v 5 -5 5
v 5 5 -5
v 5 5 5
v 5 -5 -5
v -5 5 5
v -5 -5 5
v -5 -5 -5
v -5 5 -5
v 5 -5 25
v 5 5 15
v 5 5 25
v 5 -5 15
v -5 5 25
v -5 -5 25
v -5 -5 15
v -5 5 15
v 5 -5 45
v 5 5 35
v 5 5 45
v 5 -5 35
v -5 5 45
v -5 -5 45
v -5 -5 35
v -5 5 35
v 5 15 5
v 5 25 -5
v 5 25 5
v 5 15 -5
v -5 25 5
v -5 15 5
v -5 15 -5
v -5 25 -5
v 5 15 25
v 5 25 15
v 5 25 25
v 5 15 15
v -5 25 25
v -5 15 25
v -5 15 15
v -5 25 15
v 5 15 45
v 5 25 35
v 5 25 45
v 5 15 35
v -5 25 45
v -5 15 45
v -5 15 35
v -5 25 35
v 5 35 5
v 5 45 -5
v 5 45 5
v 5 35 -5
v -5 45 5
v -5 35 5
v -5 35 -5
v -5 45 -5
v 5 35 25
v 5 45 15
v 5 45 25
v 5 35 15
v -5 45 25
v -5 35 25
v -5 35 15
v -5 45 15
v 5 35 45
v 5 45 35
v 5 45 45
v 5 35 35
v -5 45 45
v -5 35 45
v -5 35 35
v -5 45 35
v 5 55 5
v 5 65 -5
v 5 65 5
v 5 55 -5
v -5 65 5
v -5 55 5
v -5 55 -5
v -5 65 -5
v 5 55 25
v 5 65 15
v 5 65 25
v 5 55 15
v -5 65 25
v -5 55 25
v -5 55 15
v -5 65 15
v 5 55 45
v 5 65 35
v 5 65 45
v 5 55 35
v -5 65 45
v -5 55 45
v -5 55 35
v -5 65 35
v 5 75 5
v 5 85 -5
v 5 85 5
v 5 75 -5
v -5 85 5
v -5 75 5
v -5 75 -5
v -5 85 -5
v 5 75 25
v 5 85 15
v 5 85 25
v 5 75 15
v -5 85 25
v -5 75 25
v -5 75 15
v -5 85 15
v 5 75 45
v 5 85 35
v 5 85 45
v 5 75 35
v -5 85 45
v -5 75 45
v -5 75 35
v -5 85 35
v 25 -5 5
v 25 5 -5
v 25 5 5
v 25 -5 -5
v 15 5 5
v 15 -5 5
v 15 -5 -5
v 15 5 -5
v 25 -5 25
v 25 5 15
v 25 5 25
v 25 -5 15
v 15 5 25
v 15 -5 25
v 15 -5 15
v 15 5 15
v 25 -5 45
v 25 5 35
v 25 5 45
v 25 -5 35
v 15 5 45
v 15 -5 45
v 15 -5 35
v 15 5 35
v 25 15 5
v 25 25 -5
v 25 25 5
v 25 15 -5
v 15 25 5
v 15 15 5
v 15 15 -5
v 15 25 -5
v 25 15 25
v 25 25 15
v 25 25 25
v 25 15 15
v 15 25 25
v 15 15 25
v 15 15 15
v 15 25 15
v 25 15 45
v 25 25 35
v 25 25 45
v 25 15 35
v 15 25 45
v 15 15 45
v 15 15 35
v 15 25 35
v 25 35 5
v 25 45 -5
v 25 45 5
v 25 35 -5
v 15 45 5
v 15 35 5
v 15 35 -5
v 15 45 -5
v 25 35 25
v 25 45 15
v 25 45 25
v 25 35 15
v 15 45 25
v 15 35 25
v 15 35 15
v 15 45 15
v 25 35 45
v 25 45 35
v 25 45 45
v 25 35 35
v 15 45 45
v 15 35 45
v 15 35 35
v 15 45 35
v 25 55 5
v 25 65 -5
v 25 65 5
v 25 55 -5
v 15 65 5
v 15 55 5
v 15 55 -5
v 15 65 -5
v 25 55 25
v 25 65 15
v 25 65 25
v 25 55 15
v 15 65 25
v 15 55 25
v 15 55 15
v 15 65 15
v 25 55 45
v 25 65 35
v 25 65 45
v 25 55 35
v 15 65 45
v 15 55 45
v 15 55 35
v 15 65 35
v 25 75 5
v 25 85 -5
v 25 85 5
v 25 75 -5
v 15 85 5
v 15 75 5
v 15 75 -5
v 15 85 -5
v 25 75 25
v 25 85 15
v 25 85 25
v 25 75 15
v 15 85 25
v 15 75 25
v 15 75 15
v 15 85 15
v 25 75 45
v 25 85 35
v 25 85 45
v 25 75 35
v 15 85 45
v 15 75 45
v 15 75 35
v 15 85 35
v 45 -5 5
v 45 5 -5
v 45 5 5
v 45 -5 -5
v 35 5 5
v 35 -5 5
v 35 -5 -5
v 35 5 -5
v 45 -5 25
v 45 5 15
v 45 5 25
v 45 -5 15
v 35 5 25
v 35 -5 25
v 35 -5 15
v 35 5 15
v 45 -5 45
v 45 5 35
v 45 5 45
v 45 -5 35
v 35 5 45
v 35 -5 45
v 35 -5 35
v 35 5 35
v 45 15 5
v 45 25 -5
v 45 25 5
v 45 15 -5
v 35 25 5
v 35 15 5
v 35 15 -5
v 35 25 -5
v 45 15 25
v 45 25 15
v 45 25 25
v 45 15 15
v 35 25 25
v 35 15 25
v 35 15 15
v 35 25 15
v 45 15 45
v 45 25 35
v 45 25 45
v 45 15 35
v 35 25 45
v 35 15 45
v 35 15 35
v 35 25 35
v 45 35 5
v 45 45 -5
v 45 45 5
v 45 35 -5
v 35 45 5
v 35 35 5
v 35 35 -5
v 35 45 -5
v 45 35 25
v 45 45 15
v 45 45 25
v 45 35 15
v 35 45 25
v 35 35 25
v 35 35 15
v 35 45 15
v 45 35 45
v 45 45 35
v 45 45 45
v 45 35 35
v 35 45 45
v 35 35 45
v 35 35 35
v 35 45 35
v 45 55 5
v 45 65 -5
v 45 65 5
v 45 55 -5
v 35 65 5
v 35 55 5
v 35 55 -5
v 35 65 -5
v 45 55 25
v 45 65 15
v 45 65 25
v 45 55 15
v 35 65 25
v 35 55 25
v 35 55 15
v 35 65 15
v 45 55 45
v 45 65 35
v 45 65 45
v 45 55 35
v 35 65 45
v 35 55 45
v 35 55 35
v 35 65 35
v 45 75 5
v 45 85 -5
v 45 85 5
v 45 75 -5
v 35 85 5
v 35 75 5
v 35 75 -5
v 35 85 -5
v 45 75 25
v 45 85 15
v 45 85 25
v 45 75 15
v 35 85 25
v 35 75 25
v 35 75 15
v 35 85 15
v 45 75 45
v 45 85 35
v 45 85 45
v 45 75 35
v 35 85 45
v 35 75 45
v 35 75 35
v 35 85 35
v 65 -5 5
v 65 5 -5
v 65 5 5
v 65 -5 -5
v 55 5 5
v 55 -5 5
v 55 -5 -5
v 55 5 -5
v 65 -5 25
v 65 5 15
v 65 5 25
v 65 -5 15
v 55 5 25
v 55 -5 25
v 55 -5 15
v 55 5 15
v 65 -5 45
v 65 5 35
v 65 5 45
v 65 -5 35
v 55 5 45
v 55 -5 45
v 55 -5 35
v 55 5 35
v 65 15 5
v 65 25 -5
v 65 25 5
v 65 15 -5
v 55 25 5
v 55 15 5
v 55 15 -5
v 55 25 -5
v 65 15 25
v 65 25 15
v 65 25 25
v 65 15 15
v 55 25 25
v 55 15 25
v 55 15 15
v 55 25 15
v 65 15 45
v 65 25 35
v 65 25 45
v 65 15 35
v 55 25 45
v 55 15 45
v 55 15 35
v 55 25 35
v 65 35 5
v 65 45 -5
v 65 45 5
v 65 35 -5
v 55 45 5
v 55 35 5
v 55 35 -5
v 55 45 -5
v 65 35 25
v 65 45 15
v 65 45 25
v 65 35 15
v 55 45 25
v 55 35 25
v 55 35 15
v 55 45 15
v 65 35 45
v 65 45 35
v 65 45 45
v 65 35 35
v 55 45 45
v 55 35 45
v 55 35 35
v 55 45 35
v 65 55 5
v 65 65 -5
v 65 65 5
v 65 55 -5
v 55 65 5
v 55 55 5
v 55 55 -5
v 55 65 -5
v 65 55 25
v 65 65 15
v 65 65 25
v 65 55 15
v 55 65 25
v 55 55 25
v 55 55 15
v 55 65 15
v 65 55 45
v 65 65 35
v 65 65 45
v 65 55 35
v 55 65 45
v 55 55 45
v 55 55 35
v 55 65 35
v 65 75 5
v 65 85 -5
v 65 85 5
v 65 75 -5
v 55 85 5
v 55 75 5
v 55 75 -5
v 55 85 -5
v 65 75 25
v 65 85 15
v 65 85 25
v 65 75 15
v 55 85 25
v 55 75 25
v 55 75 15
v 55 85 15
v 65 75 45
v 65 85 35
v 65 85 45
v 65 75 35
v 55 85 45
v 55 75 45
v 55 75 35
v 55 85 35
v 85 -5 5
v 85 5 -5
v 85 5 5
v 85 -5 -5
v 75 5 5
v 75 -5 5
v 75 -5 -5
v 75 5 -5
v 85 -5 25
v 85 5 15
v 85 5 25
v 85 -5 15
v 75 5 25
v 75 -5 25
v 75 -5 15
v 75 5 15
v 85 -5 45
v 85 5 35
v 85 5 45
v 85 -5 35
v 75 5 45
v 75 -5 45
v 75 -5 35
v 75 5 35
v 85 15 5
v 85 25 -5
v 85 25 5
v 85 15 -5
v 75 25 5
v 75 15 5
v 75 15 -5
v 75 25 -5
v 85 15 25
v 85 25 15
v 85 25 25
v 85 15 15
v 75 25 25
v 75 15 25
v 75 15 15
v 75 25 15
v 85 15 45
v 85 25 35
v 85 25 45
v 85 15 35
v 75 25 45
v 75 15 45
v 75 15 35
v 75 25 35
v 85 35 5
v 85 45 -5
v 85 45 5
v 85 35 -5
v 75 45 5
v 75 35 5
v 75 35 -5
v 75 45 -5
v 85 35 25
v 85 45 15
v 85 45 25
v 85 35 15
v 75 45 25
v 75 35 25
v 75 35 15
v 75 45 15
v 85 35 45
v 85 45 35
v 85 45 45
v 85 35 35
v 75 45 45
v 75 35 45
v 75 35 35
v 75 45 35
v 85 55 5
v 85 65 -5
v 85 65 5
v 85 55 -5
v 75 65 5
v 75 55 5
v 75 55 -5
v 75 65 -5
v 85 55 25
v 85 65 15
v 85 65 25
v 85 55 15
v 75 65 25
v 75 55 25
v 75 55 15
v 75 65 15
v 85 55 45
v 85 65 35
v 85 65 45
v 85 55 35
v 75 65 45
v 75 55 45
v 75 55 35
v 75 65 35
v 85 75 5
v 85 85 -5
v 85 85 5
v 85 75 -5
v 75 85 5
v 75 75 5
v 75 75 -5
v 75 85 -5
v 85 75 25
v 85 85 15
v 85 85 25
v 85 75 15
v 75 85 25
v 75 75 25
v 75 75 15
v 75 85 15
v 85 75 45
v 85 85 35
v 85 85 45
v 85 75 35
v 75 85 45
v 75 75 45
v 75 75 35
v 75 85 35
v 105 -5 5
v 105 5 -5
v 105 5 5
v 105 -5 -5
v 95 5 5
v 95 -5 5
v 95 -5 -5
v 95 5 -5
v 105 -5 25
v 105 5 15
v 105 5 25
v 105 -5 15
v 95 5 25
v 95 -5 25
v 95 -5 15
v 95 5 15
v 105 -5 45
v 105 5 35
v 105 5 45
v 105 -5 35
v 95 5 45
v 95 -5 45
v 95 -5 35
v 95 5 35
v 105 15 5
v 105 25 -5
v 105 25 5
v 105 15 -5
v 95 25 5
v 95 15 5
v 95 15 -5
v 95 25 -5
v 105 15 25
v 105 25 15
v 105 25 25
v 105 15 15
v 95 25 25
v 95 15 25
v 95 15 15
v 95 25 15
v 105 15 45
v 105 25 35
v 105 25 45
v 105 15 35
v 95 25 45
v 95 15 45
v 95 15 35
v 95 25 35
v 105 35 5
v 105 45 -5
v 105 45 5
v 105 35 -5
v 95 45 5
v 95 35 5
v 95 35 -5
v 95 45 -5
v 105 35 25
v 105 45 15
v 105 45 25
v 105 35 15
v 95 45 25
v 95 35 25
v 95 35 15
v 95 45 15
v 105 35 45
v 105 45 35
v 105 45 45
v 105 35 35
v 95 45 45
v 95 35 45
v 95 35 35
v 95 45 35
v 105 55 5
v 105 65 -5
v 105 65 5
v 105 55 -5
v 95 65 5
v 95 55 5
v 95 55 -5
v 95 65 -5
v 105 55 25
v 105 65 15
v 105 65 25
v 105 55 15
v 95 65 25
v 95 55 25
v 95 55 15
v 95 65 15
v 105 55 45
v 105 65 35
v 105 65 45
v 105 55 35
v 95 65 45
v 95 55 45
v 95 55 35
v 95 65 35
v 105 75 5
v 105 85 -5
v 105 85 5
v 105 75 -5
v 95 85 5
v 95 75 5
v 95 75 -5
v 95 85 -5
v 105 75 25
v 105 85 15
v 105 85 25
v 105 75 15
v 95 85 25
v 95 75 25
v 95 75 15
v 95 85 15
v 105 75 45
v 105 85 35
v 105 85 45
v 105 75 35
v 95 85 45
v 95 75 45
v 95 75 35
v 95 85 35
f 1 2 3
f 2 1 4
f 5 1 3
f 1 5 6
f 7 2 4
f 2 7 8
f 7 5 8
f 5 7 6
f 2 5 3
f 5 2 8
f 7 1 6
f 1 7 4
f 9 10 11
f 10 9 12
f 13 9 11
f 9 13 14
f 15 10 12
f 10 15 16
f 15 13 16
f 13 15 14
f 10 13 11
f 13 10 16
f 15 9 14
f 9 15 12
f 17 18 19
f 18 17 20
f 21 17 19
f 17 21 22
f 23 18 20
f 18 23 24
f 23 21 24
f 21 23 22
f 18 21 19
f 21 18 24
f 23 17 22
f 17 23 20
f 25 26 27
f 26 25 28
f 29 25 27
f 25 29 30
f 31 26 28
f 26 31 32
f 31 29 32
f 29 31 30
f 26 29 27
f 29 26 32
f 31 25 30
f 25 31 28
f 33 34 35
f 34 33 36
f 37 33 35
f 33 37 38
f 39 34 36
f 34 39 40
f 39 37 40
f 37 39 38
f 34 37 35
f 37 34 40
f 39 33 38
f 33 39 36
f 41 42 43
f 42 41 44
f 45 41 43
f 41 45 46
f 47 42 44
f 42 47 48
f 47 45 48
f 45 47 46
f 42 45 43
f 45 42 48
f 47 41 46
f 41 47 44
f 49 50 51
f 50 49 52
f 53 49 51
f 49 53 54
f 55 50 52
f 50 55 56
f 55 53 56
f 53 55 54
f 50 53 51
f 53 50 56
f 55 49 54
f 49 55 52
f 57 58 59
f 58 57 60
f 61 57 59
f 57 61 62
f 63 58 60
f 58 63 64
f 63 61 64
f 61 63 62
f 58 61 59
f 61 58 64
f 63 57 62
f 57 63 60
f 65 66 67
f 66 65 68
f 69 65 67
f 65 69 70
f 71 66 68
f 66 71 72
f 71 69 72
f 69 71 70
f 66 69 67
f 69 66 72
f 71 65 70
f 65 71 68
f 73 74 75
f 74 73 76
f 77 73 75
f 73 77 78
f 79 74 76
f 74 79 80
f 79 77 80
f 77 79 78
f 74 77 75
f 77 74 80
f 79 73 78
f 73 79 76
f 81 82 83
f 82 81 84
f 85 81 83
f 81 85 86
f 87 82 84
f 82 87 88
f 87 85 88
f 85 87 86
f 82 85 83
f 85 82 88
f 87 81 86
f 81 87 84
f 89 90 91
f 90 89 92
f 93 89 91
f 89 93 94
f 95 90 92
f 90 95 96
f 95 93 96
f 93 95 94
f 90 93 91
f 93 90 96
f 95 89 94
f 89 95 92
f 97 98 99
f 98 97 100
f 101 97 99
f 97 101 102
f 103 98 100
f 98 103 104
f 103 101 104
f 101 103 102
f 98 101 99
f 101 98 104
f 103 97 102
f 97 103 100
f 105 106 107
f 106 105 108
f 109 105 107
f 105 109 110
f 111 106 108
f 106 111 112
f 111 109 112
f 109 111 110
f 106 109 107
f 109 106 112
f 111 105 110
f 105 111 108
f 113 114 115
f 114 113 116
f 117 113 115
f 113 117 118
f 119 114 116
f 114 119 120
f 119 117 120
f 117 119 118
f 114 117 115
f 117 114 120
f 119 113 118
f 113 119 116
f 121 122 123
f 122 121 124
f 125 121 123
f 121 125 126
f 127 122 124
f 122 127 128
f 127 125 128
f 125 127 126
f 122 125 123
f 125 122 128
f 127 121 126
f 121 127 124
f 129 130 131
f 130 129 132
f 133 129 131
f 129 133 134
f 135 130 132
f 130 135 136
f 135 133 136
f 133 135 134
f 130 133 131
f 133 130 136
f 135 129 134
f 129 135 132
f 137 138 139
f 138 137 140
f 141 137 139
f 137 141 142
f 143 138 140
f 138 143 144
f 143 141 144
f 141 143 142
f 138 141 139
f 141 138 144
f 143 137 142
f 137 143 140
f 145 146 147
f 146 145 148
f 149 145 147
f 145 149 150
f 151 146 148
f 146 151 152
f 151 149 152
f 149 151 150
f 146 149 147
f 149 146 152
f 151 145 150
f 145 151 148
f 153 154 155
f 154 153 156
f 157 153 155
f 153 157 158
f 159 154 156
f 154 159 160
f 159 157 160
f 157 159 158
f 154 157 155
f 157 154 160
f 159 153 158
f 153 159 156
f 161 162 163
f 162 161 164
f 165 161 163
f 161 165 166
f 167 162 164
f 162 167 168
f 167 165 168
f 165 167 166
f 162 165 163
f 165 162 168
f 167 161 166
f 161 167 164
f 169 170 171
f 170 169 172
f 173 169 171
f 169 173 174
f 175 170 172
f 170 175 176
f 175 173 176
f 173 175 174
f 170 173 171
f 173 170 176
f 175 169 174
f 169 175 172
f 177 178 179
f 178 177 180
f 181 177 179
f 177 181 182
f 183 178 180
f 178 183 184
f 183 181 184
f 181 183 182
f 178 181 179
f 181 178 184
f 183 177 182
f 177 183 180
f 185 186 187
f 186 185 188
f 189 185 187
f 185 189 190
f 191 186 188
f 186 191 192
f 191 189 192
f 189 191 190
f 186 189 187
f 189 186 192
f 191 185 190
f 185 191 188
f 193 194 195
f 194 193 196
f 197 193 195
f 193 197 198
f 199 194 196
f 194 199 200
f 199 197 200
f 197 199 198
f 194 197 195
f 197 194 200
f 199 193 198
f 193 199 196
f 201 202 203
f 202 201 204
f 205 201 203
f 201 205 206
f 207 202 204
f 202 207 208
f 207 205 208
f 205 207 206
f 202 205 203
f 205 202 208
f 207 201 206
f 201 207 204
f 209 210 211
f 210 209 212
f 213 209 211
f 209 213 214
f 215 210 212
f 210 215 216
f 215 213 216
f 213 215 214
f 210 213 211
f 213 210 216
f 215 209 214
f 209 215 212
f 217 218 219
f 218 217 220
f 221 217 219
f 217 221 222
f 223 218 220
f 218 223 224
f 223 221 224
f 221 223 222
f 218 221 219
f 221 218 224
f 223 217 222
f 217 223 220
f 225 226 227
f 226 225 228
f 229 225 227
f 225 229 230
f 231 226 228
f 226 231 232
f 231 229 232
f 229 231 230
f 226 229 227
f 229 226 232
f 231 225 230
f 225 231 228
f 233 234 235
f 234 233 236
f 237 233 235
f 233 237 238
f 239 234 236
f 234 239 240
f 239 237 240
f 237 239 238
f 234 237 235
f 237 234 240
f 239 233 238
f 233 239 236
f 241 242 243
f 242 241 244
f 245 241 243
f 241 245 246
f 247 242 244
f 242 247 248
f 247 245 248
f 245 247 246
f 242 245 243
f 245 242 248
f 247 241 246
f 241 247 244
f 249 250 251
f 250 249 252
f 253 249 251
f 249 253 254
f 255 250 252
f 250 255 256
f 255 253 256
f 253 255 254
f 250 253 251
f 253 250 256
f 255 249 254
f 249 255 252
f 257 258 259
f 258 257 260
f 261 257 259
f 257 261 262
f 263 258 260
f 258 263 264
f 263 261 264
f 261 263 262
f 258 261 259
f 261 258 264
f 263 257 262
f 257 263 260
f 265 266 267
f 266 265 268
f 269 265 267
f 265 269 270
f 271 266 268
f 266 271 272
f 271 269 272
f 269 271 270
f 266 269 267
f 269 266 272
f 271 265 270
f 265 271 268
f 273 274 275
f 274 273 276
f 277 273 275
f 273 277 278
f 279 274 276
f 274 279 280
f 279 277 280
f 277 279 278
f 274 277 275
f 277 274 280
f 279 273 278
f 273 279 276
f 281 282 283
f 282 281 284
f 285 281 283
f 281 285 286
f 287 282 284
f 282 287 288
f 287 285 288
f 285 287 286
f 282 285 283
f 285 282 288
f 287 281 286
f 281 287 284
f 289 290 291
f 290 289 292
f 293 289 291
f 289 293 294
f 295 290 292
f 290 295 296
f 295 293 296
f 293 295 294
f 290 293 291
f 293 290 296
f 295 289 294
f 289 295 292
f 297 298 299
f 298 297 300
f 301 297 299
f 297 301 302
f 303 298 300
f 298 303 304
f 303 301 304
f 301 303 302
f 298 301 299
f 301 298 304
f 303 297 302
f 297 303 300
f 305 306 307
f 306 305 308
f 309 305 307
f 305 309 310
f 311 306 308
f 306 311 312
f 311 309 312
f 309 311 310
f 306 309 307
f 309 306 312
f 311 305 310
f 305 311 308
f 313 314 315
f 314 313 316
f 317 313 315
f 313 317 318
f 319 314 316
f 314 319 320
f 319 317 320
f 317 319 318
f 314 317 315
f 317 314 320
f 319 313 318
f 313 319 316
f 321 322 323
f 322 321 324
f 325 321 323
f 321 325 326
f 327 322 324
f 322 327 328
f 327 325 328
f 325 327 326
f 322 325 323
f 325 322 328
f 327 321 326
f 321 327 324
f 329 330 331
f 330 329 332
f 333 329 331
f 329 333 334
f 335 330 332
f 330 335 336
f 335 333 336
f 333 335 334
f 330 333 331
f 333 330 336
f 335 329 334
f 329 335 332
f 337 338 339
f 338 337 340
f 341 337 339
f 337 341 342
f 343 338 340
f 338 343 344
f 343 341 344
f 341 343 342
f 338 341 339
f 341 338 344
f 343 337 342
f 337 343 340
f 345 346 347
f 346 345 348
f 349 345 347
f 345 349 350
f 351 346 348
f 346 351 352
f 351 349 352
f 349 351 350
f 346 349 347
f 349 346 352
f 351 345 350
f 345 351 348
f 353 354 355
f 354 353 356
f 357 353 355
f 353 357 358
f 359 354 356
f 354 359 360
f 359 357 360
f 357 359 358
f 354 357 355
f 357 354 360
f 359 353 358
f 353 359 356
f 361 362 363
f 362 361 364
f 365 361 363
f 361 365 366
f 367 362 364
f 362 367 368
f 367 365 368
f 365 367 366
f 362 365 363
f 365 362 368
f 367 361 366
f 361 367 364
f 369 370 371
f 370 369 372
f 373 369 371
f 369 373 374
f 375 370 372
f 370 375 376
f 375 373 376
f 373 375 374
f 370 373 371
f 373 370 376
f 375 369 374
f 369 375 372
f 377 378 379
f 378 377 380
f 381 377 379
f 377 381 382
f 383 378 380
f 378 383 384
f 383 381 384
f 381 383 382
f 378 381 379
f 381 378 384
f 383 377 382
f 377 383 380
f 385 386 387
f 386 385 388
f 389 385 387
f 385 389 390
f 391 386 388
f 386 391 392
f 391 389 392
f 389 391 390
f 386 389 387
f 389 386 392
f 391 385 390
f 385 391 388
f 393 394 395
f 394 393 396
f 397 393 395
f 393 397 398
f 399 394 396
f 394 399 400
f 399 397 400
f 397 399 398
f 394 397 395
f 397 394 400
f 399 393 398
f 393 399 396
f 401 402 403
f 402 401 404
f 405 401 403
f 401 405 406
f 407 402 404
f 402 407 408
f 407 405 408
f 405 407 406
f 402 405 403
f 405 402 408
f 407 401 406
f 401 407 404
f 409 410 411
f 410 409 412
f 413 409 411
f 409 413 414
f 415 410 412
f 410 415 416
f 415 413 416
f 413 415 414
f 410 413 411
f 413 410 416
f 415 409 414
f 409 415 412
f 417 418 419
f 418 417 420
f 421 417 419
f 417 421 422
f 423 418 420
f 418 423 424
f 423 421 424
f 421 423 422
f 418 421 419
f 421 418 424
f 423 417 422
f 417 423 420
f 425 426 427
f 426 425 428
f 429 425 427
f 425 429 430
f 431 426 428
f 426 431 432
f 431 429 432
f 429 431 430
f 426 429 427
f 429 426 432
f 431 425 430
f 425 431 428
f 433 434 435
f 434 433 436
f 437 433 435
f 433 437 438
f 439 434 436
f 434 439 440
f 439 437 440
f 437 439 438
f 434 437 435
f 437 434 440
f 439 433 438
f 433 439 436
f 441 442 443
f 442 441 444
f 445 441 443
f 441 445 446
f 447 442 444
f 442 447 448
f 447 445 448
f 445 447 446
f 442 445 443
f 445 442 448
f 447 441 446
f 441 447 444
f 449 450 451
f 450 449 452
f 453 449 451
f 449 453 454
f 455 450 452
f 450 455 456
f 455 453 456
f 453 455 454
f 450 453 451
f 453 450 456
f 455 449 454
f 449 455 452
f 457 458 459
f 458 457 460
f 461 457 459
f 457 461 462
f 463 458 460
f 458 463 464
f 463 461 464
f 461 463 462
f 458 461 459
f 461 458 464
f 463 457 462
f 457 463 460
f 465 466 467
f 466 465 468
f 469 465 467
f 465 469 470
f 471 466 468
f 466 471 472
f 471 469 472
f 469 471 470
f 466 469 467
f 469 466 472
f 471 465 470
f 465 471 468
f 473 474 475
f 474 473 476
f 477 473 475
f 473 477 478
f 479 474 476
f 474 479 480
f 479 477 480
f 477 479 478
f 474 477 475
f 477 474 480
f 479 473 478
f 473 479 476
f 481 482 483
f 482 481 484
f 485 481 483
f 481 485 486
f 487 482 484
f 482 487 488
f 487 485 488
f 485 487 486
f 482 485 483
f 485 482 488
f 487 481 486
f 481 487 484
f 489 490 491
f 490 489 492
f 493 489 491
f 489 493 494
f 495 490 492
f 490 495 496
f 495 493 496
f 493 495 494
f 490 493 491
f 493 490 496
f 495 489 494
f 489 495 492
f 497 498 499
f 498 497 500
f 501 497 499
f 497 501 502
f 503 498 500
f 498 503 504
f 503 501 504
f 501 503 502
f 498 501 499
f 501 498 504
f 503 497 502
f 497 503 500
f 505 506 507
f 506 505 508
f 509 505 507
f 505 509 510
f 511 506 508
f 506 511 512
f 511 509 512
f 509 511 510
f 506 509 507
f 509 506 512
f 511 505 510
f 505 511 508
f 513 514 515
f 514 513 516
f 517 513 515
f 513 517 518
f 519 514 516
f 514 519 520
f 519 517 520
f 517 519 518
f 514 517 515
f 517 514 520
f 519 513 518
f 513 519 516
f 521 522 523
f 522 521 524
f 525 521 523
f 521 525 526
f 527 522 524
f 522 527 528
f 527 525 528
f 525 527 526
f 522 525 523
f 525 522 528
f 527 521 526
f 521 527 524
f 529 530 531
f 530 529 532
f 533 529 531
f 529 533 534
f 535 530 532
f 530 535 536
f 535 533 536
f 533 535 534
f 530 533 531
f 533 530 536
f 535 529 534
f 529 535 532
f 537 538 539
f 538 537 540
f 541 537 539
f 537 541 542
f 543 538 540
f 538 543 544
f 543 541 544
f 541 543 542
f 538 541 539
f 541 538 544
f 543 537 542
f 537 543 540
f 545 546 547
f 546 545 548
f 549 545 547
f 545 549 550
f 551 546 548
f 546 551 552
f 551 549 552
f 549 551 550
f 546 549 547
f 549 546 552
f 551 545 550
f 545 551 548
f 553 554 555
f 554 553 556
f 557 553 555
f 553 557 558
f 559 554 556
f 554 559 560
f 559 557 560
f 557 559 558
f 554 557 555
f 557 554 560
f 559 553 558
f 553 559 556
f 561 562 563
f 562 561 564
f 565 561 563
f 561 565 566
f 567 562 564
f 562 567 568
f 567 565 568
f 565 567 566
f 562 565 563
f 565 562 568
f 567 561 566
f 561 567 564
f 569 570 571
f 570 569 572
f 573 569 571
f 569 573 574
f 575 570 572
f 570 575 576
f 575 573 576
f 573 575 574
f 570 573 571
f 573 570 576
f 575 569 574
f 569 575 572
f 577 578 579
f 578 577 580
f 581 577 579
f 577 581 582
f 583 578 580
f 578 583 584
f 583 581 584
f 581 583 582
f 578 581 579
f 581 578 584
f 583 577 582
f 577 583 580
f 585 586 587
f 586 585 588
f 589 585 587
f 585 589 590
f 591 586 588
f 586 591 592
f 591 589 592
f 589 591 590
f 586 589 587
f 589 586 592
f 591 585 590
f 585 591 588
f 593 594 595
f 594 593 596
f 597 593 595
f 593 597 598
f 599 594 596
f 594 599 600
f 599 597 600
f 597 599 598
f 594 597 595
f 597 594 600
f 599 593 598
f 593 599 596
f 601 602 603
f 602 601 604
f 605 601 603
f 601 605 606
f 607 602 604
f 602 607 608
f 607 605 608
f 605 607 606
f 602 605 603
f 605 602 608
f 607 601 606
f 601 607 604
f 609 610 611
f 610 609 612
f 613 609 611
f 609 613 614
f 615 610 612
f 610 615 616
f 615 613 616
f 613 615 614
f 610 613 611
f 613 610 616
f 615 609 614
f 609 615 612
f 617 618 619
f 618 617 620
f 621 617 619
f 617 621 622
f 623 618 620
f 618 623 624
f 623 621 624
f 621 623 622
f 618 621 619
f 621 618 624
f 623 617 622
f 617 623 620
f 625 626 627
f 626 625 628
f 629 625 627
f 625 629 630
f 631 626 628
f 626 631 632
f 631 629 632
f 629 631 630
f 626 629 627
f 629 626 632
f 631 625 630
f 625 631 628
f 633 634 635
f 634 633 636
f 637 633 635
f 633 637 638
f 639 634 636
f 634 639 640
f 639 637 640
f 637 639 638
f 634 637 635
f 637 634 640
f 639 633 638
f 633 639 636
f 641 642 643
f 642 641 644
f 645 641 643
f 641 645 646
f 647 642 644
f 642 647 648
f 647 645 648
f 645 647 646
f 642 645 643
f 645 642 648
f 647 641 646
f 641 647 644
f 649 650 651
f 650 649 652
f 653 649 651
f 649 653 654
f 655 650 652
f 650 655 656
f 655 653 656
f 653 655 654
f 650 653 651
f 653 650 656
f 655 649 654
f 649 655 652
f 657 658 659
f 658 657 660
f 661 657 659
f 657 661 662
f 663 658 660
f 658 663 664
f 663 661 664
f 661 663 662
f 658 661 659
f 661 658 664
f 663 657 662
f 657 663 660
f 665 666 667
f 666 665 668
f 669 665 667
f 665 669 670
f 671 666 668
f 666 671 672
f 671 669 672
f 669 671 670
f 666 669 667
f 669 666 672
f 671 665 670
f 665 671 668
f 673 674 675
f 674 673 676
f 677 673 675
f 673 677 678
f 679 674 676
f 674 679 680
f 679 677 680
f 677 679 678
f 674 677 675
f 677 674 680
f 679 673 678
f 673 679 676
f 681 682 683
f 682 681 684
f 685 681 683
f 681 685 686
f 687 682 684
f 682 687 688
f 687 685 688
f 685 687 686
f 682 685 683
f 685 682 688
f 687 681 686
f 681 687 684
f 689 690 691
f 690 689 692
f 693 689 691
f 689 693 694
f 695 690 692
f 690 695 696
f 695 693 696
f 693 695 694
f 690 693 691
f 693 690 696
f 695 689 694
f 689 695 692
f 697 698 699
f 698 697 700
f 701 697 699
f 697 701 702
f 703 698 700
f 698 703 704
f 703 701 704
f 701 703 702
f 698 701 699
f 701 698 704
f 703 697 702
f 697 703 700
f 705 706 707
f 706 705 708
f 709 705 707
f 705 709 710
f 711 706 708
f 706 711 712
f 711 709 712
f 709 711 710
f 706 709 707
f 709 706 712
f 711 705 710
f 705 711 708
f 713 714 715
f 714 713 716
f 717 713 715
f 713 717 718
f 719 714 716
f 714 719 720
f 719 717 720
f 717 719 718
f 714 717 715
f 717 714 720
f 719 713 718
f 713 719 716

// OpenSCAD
// by LightAtPlay
function hsv(h, s = 1, v = 1, a = 1, p, q, t) = (p == undef || q == undef || t == undef)
	? hsv(
		(h%1) * 6,
		s<0?0:s>1?1:s,
		v<0?0:v>1?1:v,
		a,
		(v<0?0:v>1?1:v) * (1 - (s<0?0:s>1?1:s)),
		(v<0?0:v>1?1:v) * (1 - (s<0?0:s>1?1:s) * ((h%1)*6-floor((h%1)*6))),
		(v<0?0:v>1?1:v) * (1 - (s<0?0:s>1?1:s) * (1 - ((h%1)*6-floor((h%1)*6))))
	)
	:
	h < 1 ? [v,t,p,a] :
	h < 2 ? [q,v,p,a] :
	h < 3 ? [p,v,t,a] :
	h < 4 ? [p,q,v,a] :
	h < 5 ? [t,p,v,a] :
	        [v,p,q,a];

function hsv1(h, s, v) = hsv(h/360,s/100,v/100);

// hue, saturation, and luminosity values
hval= [60, 75, 90, 270, 285, 300];
sval=  [0, 25, 50, 75, 100];
vval = [50, 75, 100];

for (h = [0:5]) {
    for (s =  [0:4]) {
        for (v =  [0:2]) {
            translate([h*20, s*20, v*20])
            color(hsv1(hval[h],sval[s],vval[v]))
            cube(10, center=true);
        }
    }
}
